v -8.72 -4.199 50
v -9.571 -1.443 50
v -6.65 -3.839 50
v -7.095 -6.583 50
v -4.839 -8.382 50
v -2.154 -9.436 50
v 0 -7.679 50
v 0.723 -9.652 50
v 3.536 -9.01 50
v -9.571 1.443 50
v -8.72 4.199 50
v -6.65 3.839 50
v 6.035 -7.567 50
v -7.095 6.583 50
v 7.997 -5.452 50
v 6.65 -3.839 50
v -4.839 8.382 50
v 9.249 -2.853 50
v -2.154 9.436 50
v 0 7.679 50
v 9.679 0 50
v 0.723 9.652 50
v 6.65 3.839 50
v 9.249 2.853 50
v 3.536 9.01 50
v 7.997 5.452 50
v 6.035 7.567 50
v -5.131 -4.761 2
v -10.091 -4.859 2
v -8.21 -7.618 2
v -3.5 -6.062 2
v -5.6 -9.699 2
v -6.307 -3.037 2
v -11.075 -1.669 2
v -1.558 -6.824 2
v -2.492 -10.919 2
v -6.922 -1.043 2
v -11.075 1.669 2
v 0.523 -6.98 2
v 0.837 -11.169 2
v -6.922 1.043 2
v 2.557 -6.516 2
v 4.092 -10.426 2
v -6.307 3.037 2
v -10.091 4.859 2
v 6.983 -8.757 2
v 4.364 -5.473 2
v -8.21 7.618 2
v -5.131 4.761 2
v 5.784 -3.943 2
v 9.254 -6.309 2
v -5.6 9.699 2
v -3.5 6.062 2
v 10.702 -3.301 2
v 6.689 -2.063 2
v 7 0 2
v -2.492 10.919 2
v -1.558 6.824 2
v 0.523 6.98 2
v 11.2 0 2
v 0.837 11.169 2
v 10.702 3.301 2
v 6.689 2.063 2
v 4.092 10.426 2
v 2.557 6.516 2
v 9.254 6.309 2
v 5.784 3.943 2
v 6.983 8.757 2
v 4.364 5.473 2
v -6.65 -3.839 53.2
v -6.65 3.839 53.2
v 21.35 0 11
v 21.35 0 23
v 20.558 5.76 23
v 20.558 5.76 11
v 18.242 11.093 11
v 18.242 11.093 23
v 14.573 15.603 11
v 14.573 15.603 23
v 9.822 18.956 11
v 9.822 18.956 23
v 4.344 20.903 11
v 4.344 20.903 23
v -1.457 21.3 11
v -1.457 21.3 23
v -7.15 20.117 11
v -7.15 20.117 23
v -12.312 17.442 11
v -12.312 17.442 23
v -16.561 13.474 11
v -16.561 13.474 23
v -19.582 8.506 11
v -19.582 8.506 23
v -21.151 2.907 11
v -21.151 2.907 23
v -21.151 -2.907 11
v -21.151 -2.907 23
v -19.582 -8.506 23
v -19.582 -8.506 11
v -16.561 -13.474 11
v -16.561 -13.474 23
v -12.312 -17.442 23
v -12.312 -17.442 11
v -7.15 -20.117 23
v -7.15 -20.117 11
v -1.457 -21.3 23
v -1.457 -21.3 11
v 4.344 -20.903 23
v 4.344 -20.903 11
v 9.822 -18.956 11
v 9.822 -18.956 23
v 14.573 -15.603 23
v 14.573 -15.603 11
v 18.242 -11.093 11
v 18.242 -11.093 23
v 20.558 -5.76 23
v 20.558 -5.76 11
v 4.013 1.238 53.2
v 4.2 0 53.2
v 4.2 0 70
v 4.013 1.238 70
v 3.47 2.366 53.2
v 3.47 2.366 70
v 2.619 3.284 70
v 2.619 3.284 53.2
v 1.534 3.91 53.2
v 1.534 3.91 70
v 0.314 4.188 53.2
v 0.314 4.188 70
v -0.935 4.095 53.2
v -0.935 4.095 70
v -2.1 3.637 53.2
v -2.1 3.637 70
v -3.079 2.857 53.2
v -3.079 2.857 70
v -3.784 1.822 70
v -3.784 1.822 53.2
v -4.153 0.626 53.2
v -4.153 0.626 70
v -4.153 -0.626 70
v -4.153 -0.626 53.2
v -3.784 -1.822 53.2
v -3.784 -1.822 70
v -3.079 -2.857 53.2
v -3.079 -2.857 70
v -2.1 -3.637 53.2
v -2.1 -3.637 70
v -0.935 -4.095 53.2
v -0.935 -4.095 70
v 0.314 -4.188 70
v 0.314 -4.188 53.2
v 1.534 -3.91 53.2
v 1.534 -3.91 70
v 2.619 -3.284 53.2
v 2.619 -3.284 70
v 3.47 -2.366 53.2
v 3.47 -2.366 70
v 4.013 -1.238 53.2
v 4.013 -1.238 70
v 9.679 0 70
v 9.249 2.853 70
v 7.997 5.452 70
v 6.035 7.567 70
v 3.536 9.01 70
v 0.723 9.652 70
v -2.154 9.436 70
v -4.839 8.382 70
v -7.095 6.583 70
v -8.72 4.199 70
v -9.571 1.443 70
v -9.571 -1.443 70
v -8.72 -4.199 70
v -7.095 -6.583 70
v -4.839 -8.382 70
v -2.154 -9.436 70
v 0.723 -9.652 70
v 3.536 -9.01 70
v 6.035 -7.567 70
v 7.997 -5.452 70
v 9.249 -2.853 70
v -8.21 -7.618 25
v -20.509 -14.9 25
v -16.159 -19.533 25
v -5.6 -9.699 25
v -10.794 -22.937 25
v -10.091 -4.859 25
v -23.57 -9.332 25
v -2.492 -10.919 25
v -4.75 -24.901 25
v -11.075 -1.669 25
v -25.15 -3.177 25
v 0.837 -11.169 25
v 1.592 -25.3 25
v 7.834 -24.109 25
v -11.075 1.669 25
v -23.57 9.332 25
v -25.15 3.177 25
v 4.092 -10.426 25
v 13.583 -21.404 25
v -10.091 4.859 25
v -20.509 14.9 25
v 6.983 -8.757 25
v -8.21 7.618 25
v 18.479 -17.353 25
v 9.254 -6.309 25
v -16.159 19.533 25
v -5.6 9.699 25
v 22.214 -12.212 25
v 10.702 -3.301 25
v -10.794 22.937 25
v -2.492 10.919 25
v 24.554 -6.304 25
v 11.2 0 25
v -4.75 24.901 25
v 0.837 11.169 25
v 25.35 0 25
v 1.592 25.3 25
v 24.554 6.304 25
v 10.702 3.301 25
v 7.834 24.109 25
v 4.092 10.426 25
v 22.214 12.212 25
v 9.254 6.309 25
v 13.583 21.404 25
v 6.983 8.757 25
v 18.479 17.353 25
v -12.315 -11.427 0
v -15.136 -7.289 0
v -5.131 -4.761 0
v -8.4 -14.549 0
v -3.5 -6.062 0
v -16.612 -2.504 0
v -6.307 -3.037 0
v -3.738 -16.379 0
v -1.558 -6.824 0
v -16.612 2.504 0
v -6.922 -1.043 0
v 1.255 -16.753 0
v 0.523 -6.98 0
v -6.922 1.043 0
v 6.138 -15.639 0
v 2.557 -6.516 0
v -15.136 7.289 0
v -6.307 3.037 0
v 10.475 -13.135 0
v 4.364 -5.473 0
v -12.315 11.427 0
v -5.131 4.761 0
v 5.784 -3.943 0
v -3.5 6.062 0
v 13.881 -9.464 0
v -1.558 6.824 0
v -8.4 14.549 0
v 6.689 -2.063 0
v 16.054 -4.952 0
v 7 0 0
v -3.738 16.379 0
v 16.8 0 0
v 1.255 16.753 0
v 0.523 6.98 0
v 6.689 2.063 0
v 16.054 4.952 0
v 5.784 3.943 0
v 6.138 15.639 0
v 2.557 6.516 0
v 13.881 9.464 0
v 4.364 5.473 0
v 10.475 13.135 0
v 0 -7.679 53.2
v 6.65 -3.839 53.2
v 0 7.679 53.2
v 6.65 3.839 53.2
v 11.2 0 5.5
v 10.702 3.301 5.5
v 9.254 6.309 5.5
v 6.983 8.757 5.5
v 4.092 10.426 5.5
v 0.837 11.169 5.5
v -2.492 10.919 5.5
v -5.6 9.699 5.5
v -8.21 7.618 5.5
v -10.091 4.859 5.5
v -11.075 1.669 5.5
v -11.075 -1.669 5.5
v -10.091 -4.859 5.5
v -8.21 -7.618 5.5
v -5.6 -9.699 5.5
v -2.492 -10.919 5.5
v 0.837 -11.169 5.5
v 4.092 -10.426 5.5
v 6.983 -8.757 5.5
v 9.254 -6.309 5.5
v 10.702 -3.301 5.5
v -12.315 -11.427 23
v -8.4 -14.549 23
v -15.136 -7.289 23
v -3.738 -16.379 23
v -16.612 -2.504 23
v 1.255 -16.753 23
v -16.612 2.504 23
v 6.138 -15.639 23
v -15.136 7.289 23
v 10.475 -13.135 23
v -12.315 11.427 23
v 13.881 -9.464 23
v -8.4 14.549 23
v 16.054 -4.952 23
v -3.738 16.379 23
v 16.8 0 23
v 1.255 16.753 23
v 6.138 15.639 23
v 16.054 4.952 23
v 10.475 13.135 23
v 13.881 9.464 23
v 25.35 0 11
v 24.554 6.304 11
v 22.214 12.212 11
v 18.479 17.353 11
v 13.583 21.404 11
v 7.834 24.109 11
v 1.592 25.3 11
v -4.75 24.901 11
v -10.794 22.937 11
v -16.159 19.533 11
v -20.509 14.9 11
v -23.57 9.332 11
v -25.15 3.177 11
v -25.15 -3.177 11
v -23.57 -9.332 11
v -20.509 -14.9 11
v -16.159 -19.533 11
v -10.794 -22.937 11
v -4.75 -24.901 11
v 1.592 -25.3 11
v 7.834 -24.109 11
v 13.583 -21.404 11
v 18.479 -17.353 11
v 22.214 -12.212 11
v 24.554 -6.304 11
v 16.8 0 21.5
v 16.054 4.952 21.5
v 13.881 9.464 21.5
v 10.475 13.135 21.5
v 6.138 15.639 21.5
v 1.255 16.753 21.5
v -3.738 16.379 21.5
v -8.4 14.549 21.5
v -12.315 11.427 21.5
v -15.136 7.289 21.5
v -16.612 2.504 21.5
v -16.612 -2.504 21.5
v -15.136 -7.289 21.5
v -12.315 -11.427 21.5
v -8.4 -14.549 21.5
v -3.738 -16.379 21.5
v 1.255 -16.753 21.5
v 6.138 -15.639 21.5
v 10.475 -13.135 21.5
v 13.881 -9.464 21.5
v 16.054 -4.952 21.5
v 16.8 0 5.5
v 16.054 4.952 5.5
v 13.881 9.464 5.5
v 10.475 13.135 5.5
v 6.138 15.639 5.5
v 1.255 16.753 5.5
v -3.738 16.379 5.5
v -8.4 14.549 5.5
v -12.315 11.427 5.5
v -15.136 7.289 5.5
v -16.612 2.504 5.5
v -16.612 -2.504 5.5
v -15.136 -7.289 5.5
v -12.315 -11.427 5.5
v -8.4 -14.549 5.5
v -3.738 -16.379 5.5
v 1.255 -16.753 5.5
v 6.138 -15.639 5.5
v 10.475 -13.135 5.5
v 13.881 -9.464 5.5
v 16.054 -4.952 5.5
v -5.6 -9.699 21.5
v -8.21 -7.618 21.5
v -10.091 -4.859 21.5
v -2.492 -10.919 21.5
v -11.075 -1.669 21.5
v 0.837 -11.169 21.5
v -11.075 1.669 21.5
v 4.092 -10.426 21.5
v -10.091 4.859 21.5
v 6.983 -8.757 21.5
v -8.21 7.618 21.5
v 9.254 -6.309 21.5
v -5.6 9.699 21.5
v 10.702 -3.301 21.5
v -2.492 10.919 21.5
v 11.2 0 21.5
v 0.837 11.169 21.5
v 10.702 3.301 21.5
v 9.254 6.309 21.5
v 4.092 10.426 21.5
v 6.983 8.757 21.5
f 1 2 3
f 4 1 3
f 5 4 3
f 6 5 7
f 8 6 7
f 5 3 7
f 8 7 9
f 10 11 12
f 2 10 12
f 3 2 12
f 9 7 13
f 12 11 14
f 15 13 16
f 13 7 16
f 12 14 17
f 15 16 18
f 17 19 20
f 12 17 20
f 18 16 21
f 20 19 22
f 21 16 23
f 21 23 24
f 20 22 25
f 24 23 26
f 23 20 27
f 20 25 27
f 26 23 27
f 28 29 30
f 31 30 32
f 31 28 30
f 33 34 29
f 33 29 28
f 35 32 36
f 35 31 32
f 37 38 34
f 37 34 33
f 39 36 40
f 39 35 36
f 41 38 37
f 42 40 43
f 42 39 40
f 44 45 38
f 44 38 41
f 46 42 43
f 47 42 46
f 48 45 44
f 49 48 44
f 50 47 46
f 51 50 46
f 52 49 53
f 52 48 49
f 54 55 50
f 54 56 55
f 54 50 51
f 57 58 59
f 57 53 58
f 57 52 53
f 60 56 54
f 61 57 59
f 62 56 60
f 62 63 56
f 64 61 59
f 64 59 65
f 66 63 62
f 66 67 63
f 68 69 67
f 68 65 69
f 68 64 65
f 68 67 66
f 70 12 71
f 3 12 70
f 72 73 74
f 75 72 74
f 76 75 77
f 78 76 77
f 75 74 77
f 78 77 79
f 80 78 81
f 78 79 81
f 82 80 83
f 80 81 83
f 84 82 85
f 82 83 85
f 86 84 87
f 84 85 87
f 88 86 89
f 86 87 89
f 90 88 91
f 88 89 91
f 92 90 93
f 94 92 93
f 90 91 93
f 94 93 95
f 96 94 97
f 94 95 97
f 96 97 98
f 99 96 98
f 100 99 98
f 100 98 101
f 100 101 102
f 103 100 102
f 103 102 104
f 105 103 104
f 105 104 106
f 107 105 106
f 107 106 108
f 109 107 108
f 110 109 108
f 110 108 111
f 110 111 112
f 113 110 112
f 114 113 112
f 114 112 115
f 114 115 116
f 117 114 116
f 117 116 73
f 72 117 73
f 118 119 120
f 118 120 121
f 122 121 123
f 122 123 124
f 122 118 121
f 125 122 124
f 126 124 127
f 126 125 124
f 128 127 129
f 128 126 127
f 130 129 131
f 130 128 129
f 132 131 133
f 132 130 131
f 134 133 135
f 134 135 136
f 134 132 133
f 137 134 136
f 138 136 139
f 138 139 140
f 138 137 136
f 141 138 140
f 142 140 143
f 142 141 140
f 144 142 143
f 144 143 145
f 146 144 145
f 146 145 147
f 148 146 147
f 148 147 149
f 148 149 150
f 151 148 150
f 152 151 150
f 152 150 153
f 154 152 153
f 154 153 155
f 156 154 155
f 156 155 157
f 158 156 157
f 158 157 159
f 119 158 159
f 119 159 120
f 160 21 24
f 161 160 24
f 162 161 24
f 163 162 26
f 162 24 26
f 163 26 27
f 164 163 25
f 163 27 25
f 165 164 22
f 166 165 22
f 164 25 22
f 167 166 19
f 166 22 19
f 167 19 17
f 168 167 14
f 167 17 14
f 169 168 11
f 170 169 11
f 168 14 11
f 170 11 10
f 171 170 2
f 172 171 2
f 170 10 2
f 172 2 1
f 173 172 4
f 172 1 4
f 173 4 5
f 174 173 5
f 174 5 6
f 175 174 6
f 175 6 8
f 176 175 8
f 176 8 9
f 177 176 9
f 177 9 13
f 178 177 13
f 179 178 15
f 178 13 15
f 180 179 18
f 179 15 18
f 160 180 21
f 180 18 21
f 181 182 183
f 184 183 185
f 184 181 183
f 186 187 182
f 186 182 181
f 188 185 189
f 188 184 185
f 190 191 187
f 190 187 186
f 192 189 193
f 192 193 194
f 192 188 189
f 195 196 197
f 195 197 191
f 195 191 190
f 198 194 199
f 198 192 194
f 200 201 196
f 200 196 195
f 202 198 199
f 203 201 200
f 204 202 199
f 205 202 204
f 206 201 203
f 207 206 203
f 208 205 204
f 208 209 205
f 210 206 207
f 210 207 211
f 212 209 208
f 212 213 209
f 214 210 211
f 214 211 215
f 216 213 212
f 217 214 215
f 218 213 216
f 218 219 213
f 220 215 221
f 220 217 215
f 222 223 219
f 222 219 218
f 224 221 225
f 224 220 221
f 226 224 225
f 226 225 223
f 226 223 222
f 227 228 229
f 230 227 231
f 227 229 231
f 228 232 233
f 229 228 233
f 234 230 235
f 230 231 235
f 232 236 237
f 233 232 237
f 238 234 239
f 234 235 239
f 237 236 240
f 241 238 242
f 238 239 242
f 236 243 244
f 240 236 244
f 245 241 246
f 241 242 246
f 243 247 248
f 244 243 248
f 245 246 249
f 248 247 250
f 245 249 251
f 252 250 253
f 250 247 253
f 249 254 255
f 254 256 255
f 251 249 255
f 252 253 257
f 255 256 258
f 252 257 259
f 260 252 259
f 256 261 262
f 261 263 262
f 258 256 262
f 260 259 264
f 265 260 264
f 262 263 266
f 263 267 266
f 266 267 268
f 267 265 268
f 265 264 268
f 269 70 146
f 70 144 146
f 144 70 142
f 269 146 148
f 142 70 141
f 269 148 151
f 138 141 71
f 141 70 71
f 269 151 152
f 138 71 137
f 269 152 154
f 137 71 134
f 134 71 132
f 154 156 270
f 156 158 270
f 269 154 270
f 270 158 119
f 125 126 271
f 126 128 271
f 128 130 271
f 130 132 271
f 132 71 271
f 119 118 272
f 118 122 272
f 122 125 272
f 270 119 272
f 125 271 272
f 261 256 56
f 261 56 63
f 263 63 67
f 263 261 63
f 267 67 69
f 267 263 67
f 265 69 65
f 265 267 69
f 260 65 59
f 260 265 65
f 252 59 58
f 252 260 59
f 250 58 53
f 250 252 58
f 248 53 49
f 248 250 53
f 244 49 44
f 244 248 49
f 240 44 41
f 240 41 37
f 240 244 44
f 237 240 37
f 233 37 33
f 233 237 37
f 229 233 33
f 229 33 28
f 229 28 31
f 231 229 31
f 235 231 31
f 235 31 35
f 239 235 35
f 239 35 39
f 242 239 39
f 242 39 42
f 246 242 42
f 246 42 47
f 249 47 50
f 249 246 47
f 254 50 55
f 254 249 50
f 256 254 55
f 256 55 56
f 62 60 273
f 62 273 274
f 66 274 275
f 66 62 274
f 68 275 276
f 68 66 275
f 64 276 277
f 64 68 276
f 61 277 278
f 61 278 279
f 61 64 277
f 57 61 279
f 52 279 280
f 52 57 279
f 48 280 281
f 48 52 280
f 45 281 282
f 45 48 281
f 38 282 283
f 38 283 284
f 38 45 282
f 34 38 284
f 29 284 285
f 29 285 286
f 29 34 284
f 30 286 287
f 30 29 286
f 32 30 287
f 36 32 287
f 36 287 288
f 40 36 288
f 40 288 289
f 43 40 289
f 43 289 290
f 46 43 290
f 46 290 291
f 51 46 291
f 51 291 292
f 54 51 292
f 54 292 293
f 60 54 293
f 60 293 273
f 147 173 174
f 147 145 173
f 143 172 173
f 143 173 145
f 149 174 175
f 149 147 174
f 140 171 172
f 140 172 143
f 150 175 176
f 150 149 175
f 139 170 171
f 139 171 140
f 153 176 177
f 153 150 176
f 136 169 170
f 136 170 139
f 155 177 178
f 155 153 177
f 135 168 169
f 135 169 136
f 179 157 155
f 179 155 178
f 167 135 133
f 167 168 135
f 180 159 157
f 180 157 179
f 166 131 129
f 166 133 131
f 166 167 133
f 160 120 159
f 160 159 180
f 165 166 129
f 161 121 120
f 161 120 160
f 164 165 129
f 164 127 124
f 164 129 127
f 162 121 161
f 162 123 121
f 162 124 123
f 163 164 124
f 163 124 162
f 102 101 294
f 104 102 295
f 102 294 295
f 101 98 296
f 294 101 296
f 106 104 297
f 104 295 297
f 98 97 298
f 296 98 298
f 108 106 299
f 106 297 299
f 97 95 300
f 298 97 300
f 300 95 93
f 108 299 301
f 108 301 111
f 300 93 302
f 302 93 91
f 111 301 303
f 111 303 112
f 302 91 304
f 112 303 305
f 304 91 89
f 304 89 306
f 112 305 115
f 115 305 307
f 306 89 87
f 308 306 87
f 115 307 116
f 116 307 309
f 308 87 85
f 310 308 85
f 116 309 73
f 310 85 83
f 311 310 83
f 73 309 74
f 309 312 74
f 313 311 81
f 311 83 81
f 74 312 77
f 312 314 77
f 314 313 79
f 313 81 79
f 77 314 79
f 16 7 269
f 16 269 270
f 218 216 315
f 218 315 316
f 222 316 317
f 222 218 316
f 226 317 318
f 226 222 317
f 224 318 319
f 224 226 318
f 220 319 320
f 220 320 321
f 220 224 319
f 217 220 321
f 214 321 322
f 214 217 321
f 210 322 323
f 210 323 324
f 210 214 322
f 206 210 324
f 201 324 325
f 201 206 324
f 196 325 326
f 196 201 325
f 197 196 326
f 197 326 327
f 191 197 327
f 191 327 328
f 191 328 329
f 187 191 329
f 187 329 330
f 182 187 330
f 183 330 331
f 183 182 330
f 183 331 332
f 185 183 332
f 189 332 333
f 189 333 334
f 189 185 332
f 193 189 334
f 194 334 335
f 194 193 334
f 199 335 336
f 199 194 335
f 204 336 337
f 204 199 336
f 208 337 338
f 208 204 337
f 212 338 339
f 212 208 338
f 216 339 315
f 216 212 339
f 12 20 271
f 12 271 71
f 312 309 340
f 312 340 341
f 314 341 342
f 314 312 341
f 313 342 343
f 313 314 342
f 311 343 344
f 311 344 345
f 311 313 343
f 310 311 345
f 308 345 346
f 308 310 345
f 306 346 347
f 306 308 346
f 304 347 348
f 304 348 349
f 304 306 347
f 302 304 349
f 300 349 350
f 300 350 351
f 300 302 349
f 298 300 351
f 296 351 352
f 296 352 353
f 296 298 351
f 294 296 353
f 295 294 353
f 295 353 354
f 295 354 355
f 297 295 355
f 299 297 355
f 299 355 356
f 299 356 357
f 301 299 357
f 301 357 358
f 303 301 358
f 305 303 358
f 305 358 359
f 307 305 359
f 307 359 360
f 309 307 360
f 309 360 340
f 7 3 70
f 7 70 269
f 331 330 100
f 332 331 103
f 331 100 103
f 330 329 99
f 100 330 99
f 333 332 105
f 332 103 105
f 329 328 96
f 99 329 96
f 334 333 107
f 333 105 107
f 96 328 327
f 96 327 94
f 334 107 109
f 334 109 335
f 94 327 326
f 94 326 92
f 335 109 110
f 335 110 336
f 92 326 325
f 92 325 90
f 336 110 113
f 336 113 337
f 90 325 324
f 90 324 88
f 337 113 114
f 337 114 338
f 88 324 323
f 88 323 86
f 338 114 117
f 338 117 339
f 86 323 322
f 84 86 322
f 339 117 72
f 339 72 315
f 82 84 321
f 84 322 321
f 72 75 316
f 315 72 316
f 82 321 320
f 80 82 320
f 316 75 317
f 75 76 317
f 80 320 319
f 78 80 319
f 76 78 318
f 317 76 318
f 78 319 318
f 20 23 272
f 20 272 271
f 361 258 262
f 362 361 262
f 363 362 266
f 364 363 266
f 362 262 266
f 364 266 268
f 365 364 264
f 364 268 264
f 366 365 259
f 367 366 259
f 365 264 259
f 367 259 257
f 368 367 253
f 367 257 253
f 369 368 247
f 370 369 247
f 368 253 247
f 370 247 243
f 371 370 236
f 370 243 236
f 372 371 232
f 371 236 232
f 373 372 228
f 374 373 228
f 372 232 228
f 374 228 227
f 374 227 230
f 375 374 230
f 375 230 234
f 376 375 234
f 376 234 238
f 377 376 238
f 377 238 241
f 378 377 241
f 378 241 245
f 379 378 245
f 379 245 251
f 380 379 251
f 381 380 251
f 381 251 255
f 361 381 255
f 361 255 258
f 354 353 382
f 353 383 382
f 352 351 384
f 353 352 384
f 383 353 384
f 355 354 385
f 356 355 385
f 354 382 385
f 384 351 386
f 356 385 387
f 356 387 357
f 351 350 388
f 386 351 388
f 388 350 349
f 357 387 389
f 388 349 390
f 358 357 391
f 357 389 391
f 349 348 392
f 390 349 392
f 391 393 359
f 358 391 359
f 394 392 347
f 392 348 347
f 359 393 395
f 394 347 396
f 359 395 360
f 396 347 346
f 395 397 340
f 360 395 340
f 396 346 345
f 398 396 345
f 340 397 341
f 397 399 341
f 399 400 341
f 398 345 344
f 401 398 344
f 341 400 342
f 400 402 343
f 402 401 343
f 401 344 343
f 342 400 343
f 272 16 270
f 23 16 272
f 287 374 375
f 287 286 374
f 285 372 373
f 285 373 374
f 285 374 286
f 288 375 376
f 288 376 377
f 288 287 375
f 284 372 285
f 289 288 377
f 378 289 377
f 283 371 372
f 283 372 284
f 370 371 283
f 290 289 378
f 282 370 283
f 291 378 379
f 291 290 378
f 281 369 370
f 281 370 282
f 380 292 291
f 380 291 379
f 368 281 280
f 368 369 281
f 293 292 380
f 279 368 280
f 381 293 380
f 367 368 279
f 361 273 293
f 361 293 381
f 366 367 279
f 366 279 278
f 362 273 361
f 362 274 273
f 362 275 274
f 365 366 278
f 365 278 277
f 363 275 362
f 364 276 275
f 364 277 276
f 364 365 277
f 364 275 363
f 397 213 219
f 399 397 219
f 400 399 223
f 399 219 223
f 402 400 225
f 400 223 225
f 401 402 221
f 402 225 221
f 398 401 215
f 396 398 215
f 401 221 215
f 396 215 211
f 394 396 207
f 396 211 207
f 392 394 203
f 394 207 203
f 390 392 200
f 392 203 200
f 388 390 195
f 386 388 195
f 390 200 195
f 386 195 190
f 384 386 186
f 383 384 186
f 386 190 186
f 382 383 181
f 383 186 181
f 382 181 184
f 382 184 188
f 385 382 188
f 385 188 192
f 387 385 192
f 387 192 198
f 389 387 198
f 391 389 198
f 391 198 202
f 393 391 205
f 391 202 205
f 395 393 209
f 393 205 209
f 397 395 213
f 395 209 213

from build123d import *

# Parameters (mm, degrees)
F4_R      = 16.8
F4_R_2    = 11.2
F4_R_3    = 7
F5_DEPTH  = 2
F6_DEPTH  = 5.5
F8_R      = 16.8
F8_R_2    = 11.2
F9_DEPTH  = 3.5
F8_R_3    = 21.35
F10_DEPTH = 2
F8_R_4    = 25.35
F11_DEPTH = 14
F13_R     = 9.6787585802
F13_R_2   = 4.2
F14_DEPTH = 20
F15_DEPTH = 3.2


with BuildPart() as f5:
    # F4 (on Top) → F5 (new body)
    with BuildSketch(Plane.XY):
        Circle(F4_R)
        Circle(F4_R_2, mode=Mode.SUBTRACT)
        Circle(F4_R_2)
        Circle(F4_R_3, mode=Mode.SUBTRACT)
    extrude(amount=F5_DEPTH)

    # F4 (on Top) → F6 (join)
    with BuildSketch(Plane.XY):
        Circle(F4_R)
        Circle(F4_R_2, mode=Mode.SUBTRACT)
    extrude(amount=F6_DEPTH)


with BuildPart() as f9:
    # F8 (on offset) → F9 (new body)
    with BuildSketch(Plane.XY.offset(25)):
        Circle(F8_R)
        Circle(F8_R_2, mode=Mode.SUBTRACT)
    extrude(amount=-F9_DEPTH)

    # F8 (on offset) → F10 (join)
    with BuildSketch(Plane.XY.offset(25)):
        Circle(F8_R_3)
        Circle(F8_R, mode=Mode.SUBTRACT)
    extrude(amount=-F10_DEPTH)

    # F8 (on offset) → F11 (join)
    with BuildSketch(Plane.XY.offset(25)):
        Circle(F8_R_4)
        Circle(F8_R_3, mode=Mode.SUBTRACT)
    extrude(amount=-F11_DEPTH)


with BuildPart() as f14:
    # F13 (on offset) → F14 (new body)
    with BuildSketch(Plane.XY.offset(50)):
        Circle(F13_R)
        Polygon((0, 7.6787585802), (6.65, 3.8393792901), (6.65, -3.8393792901), (0, -7.6787585802), (-6.65, -3.8393792901), (-6.65, 3.8393792901), align=None, mode=Mode.SUBTRACT)
        Polygon((6.65, -3.8393792901), (6.65, 3.8393792901), (0, 7.6787585802), (-6.65, 3.8393792901), (-6.65, -3.8393792901), (0, -7.6787585802), align=None)
        Circle(F13_R_2, mode=Mode.SUBTRACT)
    extrude(amount=F14_DEPTH)

    # F13 (on offset) → F15 (cut)
    with BuildSketch(Plane.XY.offset(50)):
        Polygon((6.65, -3.8393792901), (6.65, 3.8393792901), (0, 7.6787585802), (-6.65, 3.8393792901), (-6.65, -3.8393792901), (0, -7.6787585802), align=None)
        Circle(F13_R_2, mode=Mode.SUBTRACT)
    extrude(amount=F15_DEPTH, mode=Mode.SUBTRACT)


solid = Compound([f5.part, f9.part, f14.part])
